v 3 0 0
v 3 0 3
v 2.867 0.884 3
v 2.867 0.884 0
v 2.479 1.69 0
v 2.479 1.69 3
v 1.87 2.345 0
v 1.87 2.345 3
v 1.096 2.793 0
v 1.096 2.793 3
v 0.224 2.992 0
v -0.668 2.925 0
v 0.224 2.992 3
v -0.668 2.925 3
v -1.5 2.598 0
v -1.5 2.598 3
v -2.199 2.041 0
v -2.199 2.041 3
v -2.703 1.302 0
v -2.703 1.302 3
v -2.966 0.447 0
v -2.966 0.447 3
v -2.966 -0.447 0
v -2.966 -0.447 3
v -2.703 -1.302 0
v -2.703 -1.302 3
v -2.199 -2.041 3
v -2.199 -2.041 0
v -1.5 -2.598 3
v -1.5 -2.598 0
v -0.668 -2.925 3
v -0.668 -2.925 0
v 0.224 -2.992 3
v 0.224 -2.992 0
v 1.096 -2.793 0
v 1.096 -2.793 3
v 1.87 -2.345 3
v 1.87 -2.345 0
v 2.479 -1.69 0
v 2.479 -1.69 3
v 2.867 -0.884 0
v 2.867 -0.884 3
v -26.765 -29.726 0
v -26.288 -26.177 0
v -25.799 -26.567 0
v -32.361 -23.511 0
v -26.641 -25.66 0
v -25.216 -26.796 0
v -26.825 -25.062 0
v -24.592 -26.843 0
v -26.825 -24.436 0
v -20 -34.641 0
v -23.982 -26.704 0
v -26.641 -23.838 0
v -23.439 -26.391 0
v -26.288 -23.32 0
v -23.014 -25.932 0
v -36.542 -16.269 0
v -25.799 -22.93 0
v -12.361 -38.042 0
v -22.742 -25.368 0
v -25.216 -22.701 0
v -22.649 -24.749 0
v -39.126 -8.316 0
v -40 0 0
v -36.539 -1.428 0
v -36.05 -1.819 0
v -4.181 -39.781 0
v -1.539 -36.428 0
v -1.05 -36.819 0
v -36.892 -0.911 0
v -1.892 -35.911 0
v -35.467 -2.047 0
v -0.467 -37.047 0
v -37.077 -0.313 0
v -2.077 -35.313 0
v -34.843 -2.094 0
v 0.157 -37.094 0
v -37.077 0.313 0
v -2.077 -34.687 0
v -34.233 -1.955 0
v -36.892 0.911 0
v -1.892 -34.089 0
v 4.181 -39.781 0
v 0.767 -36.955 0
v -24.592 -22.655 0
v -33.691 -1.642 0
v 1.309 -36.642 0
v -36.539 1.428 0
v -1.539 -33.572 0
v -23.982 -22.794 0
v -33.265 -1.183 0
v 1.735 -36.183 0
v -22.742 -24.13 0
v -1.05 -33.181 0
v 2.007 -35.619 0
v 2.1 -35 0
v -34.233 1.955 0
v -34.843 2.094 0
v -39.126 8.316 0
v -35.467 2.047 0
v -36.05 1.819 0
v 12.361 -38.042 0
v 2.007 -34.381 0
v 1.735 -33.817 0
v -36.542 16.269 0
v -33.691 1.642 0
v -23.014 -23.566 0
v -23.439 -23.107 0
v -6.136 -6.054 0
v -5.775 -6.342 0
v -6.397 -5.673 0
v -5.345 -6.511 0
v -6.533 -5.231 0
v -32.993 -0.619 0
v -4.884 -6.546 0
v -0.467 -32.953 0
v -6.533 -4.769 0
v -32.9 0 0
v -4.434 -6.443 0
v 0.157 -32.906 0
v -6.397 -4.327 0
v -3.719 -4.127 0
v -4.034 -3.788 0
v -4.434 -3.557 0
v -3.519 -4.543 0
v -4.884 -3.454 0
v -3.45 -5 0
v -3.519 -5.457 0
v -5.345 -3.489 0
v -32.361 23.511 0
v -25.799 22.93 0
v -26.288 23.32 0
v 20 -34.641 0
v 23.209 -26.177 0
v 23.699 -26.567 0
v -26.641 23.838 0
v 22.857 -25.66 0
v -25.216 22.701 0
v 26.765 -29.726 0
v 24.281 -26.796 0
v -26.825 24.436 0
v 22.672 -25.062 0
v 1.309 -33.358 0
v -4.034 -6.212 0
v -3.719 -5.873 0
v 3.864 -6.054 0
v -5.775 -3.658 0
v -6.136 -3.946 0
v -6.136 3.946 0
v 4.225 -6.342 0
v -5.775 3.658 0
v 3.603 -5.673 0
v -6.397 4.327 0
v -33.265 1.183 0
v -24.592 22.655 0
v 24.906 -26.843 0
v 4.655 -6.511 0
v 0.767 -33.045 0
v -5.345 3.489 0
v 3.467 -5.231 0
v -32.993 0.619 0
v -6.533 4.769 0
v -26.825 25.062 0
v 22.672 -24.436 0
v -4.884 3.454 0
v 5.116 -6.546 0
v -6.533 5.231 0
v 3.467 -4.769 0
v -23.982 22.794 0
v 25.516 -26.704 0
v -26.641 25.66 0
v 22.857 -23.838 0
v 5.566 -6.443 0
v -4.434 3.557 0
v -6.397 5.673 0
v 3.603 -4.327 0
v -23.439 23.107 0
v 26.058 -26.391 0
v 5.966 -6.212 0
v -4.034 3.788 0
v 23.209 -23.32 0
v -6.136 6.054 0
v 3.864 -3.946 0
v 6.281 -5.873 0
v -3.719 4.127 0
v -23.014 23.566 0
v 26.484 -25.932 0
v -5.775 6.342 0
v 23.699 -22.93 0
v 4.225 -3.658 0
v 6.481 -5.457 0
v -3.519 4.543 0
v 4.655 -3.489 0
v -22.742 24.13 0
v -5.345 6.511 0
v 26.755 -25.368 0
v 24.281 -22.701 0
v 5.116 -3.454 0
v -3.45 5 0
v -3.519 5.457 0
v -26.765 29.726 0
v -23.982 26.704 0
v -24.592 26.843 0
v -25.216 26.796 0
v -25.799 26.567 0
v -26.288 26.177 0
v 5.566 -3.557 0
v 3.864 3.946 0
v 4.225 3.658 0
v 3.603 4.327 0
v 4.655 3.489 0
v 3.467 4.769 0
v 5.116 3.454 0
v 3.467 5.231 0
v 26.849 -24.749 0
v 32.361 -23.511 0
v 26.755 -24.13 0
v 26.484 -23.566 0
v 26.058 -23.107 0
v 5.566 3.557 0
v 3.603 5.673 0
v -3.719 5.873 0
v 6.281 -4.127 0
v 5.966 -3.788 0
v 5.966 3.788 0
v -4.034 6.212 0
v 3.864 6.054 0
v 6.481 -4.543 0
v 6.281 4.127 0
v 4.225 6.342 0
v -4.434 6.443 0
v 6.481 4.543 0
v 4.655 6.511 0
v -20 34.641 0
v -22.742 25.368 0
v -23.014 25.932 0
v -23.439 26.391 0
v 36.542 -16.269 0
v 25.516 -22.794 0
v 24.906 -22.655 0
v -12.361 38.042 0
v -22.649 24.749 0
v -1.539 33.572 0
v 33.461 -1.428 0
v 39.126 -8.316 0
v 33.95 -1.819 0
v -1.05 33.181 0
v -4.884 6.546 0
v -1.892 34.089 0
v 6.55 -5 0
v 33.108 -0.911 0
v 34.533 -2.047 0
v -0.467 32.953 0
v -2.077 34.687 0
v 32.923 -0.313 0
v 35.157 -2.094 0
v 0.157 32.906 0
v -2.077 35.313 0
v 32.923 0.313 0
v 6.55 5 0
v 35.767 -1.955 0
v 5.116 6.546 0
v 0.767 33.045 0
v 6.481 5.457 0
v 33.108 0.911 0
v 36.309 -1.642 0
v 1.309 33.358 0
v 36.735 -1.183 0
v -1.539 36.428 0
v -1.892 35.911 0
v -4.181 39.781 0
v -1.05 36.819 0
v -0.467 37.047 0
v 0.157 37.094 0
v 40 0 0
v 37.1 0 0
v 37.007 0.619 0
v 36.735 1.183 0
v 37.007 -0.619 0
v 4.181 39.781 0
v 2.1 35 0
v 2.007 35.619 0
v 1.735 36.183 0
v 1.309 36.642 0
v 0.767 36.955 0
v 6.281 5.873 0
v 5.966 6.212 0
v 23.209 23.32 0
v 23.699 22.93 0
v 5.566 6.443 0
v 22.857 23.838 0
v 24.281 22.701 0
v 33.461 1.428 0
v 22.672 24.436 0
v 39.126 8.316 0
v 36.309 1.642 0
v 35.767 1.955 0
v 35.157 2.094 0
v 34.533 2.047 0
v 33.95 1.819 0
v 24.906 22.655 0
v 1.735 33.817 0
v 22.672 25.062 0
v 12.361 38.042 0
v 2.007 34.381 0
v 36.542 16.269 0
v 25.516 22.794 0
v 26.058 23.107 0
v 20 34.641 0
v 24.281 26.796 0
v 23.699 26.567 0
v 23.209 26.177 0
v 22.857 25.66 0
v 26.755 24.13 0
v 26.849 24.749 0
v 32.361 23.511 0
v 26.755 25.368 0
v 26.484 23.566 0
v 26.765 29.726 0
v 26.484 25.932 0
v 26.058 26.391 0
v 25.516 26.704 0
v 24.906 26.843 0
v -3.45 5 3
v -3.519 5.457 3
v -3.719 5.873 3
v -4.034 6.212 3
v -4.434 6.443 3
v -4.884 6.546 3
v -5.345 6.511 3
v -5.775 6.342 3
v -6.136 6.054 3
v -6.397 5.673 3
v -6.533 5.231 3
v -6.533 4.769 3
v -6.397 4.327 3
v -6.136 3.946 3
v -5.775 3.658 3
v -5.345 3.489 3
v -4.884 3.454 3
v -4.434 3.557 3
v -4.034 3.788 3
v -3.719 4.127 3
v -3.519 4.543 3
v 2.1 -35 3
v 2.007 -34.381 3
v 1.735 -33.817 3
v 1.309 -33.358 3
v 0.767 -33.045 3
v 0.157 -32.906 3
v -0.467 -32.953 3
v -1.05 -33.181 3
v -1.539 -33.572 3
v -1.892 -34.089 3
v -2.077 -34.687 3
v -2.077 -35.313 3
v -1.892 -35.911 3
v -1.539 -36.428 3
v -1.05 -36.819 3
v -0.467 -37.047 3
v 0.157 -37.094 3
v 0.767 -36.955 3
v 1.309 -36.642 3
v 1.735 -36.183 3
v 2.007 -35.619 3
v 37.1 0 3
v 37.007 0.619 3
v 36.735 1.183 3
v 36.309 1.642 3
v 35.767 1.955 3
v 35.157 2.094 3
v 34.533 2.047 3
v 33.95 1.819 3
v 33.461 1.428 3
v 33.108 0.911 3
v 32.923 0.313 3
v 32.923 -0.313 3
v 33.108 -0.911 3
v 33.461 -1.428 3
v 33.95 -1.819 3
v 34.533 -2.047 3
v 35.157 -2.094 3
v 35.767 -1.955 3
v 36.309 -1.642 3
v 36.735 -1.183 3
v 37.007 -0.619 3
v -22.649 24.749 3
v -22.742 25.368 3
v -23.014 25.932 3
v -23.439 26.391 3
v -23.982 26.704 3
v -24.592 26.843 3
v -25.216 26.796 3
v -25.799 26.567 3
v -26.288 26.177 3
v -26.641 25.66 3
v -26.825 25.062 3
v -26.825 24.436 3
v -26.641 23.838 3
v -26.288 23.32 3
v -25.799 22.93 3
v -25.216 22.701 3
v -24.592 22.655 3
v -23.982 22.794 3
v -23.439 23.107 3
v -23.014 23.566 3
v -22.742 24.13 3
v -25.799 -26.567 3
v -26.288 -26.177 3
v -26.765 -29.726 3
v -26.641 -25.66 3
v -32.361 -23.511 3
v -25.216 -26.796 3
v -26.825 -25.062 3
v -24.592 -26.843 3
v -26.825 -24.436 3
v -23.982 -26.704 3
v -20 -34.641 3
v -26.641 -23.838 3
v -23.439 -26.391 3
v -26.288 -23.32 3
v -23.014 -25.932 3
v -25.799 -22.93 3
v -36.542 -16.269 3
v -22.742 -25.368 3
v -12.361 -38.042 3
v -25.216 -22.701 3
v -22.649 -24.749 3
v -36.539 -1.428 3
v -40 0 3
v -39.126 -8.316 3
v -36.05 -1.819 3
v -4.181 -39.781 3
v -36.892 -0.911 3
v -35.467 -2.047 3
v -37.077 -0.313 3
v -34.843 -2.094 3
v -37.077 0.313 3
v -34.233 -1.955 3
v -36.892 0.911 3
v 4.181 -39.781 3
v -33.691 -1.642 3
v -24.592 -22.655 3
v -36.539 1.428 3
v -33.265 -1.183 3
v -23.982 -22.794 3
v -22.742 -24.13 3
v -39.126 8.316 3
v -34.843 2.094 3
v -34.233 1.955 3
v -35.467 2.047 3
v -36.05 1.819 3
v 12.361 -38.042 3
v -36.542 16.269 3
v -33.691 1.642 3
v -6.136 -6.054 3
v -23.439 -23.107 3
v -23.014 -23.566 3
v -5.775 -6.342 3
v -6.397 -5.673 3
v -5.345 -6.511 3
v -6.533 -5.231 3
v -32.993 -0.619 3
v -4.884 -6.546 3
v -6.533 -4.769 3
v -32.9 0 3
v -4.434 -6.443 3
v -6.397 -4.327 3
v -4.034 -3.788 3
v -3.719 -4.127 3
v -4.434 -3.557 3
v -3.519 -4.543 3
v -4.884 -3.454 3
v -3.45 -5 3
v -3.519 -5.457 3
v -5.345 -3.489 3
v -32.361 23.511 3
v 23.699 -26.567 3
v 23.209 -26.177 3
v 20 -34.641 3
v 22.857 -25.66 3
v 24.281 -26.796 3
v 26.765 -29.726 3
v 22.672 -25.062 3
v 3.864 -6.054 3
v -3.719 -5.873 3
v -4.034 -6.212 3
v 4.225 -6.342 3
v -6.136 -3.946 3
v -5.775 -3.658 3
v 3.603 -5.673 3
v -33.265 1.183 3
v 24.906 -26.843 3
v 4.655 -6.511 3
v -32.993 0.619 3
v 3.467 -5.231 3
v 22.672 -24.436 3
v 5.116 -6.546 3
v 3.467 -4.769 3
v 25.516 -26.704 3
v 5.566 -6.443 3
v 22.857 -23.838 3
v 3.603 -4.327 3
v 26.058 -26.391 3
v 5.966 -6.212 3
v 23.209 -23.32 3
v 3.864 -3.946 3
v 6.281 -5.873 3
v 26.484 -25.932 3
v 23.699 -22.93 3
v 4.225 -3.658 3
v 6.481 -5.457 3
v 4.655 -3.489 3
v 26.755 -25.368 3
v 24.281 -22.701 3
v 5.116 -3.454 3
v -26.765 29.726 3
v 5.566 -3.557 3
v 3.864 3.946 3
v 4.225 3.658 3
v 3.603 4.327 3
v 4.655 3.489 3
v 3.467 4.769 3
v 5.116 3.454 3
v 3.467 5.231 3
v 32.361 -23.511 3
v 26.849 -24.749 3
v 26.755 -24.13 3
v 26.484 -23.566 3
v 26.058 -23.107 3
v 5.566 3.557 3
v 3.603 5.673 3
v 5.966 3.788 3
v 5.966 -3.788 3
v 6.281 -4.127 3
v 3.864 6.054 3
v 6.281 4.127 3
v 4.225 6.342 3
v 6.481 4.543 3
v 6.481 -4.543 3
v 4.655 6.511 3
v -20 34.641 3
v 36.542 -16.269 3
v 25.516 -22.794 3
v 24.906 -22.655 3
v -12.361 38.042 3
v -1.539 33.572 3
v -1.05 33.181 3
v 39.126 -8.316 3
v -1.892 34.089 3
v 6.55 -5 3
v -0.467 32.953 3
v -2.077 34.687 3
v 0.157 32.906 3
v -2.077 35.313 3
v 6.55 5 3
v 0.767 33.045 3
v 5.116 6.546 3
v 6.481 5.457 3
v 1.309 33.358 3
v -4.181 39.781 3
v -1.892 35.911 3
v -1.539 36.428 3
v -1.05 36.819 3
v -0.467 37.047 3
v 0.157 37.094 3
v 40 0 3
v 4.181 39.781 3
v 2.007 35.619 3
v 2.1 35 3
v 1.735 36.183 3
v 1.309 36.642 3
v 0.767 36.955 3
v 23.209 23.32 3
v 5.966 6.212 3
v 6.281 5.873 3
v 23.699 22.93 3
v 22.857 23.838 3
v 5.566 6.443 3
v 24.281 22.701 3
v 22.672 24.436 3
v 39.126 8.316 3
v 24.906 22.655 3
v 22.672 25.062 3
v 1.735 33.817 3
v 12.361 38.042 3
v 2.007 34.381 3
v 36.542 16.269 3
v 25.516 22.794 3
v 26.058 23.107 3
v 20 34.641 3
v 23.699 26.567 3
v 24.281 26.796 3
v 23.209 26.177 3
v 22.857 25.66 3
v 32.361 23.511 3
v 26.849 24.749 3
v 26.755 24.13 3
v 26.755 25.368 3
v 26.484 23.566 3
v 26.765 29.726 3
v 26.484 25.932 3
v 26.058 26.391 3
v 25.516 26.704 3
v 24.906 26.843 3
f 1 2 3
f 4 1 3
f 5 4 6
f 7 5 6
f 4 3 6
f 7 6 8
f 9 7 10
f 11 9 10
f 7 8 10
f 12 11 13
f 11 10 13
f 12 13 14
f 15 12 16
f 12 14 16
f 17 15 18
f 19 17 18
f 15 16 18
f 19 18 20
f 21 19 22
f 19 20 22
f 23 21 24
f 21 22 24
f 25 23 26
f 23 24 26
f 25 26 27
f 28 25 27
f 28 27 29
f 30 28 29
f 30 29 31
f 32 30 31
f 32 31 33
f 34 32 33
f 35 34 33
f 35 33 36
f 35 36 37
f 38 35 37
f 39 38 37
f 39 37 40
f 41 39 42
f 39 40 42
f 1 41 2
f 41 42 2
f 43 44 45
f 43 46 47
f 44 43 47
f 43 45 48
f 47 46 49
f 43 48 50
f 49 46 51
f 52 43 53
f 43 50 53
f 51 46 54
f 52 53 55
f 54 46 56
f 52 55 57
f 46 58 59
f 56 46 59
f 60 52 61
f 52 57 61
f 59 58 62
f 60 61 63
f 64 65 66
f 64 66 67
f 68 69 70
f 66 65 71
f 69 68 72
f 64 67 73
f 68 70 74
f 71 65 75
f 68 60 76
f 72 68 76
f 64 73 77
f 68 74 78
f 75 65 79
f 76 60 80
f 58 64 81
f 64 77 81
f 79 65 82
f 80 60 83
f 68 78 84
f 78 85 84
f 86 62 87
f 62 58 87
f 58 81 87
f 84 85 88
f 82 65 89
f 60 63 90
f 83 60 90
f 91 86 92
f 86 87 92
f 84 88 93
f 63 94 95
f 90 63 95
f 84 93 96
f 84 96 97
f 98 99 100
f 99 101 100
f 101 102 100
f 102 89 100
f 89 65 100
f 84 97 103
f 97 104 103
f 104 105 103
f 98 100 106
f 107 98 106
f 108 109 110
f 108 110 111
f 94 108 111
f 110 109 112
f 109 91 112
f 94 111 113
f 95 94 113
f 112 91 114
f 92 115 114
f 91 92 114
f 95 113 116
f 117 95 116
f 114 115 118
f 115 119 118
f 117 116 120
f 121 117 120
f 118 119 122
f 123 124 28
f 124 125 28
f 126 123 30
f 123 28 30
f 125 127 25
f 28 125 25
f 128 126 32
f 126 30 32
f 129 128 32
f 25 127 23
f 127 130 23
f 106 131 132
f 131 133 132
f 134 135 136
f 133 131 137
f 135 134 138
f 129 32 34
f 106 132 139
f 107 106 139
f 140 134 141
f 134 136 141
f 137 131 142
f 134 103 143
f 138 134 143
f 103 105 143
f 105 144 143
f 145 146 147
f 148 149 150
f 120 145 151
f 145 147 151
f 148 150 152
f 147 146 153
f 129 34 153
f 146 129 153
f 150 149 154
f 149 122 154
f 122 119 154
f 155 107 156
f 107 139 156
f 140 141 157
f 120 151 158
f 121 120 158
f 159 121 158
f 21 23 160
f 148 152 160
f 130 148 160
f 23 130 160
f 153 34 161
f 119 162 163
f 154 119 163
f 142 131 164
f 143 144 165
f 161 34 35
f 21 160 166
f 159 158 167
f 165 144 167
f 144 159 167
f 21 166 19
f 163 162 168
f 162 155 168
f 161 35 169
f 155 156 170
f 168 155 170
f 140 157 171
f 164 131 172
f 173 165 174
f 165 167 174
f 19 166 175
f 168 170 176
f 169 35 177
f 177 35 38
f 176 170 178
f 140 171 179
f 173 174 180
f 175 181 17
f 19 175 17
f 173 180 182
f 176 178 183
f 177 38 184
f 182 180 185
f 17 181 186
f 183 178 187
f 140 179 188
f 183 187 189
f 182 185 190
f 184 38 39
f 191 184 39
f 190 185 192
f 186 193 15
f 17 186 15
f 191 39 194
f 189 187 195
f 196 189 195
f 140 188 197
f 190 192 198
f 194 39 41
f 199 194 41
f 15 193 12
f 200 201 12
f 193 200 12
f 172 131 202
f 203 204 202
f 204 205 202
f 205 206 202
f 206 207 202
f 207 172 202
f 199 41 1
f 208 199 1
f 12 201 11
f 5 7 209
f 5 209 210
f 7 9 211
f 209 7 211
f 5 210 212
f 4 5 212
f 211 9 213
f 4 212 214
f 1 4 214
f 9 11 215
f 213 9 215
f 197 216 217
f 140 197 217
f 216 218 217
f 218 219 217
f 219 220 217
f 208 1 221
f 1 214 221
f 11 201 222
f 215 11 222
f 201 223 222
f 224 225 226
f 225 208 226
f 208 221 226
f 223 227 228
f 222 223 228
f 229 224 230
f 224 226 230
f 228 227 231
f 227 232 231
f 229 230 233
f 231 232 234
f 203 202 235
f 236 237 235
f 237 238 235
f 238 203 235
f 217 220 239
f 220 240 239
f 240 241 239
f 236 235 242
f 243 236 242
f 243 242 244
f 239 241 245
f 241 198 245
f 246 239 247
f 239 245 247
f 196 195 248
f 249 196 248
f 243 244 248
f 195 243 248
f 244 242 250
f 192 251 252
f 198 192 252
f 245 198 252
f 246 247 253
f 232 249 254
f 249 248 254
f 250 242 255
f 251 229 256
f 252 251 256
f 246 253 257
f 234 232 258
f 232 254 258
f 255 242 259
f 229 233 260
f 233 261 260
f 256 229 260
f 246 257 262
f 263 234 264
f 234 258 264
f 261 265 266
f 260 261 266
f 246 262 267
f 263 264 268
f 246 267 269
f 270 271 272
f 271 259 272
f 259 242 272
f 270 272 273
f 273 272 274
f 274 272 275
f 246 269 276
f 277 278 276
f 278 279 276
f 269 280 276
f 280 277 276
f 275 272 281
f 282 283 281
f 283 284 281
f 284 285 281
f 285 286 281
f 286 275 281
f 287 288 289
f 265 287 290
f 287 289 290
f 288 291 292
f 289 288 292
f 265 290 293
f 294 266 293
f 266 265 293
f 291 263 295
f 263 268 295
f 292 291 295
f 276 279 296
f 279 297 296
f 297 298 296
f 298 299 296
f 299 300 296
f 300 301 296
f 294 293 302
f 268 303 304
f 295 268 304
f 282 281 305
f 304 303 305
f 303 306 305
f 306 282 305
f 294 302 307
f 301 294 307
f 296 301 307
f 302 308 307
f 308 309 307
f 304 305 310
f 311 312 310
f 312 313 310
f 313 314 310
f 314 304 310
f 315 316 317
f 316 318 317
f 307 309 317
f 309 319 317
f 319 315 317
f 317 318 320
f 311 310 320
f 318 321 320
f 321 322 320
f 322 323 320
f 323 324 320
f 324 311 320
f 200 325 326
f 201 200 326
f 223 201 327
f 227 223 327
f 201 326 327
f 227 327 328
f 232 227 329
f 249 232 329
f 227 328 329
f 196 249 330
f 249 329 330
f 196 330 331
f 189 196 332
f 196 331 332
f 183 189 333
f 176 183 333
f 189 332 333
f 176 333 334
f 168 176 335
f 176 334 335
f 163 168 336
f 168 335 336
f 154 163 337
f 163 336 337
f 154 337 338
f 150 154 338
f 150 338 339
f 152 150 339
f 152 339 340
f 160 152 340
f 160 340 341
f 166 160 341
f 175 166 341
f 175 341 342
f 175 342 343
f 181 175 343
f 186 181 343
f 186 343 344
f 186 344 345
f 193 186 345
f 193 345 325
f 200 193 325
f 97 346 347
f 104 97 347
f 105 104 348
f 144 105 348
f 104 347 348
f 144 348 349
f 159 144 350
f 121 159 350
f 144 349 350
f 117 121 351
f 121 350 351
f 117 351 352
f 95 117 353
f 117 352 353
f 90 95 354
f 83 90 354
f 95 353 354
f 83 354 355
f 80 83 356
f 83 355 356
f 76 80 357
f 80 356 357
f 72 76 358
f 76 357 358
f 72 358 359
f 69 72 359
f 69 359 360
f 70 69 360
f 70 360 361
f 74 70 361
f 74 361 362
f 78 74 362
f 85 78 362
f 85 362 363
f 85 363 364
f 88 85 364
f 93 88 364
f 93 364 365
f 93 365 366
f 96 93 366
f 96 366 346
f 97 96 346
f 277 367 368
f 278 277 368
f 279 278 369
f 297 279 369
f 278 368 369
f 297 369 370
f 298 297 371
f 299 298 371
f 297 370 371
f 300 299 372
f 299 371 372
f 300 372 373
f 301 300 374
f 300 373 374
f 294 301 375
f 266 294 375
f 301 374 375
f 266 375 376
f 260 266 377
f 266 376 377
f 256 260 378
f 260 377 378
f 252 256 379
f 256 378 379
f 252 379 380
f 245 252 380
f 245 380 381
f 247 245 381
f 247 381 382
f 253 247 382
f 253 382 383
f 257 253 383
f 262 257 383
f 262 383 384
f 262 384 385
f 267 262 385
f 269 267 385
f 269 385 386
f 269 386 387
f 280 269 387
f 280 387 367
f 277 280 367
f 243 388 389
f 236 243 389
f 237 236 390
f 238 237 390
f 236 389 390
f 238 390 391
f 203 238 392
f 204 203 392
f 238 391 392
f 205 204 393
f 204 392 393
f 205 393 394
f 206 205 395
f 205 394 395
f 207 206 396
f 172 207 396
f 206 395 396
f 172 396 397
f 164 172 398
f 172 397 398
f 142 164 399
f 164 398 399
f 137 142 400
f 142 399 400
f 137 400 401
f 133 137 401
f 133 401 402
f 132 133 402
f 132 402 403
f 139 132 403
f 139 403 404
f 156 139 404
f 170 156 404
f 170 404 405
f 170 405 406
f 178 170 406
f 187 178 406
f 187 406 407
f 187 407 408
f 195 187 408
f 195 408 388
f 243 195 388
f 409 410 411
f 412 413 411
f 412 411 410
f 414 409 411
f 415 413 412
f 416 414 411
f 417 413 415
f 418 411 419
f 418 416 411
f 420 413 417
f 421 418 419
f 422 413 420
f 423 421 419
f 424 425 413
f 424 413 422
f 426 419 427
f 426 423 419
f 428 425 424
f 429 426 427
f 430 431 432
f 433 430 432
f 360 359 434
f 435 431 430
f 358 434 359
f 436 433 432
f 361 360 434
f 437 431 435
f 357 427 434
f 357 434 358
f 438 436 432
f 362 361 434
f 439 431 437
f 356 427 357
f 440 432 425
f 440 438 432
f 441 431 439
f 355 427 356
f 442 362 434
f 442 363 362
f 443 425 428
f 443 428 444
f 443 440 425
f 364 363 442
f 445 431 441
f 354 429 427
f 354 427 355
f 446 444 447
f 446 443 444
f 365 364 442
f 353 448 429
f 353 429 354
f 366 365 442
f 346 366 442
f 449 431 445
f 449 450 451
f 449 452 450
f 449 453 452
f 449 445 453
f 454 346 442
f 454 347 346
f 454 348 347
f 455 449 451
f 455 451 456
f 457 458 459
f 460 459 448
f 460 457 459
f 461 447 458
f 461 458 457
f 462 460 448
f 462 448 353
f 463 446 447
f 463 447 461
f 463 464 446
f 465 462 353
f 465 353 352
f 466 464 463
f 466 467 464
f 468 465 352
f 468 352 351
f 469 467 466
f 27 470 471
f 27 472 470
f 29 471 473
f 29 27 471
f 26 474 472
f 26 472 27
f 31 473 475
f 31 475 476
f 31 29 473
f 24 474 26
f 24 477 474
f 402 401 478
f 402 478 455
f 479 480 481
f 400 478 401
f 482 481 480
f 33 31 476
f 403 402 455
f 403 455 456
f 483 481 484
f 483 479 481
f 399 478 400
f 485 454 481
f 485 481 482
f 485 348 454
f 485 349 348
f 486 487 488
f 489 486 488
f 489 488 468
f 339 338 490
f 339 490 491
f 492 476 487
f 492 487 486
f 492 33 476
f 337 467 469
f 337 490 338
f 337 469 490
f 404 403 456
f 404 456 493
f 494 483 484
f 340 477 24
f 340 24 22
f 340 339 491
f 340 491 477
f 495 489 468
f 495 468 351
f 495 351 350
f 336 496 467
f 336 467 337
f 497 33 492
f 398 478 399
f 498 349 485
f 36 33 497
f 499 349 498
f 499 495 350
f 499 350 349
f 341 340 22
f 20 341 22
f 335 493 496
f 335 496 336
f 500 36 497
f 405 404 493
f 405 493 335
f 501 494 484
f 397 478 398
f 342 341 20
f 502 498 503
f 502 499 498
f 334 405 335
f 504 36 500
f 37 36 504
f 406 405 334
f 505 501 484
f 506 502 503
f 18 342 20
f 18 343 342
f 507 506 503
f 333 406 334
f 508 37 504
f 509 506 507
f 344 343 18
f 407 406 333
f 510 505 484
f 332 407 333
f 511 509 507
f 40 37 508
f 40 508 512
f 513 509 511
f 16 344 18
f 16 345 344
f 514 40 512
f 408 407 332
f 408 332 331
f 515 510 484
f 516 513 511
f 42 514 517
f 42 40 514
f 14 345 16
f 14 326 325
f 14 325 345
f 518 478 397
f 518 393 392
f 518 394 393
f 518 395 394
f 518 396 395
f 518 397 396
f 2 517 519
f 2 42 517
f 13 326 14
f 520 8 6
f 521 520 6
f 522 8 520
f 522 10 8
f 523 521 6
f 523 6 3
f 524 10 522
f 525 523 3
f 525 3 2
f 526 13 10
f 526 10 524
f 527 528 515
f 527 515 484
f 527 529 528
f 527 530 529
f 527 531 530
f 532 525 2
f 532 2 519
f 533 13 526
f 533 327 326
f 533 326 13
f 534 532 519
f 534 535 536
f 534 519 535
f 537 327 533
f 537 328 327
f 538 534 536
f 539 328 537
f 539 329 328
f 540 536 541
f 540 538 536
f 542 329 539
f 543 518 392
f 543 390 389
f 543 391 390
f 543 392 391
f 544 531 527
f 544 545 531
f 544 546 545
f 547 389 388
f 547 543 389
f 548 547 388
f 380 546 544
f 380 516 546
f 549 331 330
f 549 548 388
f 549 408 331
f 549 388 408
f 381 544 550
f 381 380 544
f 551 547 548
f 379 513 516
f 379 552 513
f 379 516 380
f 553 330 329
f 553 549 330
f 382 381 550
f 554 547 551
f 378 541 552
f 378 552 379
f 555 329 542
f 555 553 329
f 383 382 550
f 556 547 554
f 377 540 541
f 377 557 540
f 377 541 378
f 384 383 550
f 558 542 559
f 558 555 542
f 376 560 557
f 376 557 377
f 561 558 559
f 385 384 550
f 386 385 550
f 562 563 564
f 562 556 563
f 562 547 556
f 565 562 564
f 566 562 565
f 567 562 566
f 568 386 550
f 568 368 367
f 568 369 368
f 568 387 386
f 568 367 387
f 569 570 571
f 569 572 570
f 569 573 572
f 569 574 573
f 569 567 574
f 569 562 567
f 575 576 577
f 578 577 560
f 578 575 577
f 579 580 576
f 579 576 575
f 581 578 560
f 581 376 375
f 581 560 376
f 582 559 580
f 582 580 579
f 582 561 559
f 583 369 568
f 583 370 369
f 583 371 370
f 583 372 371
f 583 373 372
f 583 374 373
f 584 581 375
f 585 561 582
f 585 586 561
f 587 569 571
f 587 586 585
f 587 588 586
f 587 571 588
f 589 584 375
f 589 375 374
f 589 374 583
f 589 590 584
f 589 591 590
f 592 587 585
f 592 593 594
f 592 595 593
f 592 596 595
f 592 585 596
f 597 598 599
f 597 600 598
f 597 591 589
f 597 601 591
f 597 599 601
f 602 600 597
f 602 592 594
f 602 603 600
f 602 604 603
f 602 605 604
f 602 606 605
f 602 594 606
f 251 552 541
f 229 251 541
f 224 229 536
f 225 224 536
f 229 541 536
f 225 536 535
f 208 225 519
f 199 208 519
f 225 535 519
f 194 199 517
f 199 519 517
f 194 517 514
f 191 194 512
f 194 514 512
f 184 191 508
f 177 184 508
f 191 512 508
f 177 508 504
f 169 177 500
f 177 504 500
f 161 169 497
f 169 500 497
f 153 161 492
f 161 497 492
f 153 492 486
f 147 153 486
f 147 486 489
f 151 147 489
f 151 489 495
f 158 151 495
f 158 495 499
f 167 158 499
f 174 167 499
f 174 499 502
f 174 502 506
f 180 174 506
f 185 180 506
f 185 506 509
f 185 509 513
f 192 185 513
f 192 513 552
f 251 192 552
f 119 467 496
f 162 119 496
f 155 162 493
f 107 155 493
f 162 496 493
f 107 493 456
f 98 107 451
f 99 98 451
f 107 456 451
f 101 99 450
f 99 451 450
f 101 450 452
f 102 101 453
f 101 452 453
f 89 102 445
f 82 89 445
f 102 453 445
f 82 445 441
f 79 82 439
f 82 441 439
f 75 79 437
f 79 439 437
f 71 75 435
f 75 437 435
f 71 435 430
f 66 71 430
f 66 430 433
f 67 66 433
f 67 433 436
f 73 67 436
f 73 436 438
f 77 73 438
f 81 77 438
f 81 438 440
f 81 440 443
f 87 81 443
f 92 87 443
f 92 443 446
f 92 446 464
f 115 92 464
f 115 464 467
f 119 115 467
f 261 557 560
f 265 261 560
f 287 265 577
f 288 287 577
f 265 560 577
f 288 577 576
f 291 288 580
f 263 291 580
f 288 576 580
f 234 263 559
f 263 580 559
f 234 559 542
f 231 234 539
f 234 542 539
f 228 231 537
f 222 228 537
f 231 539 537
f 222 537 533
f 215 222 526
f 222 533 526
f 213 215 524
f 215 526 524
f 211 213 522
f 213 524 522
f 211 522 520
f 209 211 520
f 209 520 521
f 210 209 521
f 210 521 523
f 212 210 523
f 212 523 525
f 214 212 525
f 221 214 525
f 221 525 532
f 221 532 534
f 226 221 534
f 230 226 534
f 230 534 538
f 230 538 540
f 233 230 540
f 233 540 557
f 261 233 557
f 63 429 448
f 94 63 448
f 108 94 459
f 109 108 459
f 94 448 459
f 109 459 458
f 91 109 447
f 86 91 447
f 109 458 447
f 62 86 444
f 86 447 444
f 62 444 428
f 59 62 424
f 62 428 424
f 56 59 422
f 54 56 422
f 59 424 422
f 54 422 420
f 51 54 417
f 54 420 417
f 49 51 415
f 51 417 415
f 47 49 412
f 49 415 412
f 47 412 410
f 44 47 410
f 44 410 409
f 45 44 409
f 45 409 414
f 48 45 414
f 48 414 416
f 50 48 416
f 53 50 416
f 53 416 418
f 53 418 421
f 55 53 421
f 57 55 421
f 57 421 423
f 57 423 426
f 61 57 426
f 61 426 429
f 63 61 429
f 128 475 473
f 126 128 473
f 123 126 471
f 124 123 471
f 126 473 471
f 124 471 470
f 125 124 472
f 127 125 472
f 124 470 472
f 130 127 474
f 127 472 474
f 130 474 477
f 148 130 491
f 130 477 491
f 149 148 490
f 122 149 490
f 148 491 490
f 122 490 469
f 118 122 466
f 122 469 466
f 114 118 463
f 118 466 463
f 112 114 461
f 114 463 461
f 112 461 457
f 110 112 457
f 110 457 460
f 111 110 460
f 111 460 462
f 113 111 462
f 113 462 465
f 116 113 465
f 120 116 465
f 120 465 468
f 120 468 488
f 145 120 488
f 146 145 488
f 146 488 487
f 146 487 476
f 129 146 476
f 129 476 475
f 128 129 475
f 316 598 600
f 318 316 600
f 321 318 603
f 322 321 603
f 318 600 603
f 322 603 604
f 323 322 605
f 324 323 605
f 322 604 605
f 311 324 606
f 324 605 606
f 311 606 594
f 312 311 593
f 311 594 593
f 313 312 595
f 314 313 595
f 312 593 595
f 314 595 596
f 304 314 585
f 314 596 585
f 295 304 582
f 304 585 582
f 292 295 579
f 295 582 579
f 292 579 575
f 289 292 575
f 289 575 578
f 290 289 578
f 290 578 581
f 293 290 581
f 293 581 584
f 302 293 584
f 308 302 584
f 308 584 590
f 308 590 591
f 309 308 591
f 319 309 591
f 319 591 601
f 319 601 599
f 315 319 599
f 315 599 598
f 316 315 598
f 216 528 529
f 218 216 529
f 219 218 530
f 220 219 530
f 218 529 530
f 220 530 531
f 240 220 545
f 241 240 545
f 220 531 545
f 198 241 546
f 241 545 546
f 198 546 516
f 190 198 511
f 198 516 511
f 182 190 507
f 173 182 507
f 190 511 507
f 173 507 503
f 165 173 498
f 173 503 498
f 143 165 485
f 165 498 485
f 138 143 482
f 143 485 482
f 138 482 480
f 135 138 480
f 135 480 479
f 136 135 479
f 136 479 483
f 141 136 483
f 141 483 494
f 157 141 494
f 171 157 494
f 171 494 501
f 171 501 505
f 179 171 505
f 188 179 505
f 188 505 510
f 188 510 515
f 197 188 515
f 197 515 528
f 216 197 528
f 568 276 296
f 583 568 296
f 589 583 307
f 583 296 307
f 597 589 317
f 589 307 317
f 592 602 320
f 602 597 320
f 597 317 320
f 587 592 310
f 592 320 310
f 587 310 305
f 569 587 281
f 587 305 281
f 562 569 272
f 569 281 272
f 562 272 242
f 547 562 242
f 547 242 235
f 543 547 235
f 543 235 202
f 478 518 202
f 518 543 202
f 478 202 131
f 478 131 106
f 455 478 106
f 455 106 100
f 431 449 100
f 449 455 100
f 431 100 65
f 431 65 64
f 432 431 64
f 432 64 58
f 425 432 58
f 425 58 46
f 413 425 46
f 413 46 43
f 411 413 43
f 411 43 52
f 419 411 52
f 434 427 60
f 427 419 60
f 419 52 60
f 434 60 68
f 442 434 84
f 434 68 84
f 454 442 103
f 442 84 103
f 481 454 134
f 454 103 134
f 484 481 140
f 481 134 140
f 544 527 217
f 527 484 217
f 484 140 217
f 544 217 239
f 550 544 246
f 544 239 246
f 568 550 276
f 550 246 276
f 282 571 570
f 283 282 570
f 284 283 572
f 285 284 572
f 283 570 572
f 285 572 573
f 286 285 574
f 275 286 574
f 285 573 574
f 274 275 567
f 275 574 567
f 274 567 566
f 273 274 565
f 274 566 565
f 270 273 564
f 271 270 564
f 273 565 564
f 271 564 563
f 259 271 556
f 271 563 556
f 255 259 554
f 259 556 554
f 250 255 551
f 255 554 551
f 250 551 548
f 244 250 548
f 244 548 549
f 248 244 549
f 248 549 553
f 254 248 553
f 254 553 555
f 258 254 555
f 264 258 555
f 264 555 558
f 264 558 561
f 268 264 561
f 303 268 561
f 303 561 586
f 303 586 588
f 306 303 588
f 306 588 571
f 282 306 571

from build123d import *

# Parameters (mm, degrees)
SKETCH_3_R           = 48
EXTRUDE_2_DEPTH      = 3
SKETCH_4_R           = 3
CUT_EXTRUDE_1_DEPTH  = 3
EXTRUDE_3_DEPTH      = 35
SKETCH_6_R           = 3
SKETCH_6_R_2         = 1.5
CUT_EXTRUDE_2_DEPTH  = 35
SKETCH_7_R           = 1.55
CUT_EXTRUDE_5_DEPTH  = 35
CUT_EXTRUDE_START    = -35
SKETCH_9_R           = 48
SKETCH_9_R_2         = 40
CUT_EXTRUDE_6_DEPTH  = 35
SKETCH_10_R          = 40
CUT_EXTRUDE_7_DEPTH  = 35
SKETCH_11_W          = 111.588244868
SKETCH_11_H          = 82.223617215
CUT_EXTRUDE_8_DEPTH  = 35
SKETCH_12_R          = 1
CUT_EXTRUDE_9_DEPTH  = 35
SKETCH_13_R          = 2.1
CUT_EXTRUDE_10_DEPTH = 35
SKETCH_14_R          = 1.55
CUT_EXTRUDE_11_DEPTH = 35


with BuildPart() as part:
    # 草图3 → 凸台-拉伸2 (new body)
    with BuildSketch(Plane.XY):
        Circle(SKETCH_3_R)
    extrude(amount=EXTRUDE_2_DEPTH)

    # 草图4 → 切除-拉伸1 (cut)
    with BuildSketch(Plane.XY.offset(3)):
        Circle(SKETCH_4_R)
    extrude(amount=-CUT_EXTRUDE_1_DEPTH, mode=Mode.SUBTRACT)

    # 草图5 → 凸台-拉伸3 (add)
    with BuildSketch(Plane.XY.offset(3)):
        with BuildLine():
            ThreePointArc((0, 12.5), (0.146446609, 12.853553391), (0.5, 13))
            Line((0.5, 13), (39.5, 13))
            ThreePointArc((39.5, 13), (39.853553391, 12.853553391), (40, 12.5))
            Line((40, 12.5), (40, -12.5))
            ThreePointArc((40, -12.5), (39.853553391, -12.853553391), (39.5, -13))
            Line((39.5, -13), (0.5, -13))
            ThreePointArc((0.5, -13), (0.146446609, -12.853553391), (0, -12.5))
            Line((0, -12.5), (0, -11.5))
            ThreePointArc((0, -11.5), (0.146446609, -11.146446609), (0.5, -11))
            Line((0.5, -11), (37.5, -11))
            ThreePointArc((37.5, -11), (37.853553391, -10.853553391), (38, -10.5))
            Line((38, -10.5), (38, 0))
            Line((38, 0), (38, 10.5))
            ThreePointArc((38, 10.5), (37.853553391, 10.853553391), (37.5, 11))
            Line((37.5, 11), (0.5, 11))
            ThreePointArc((0.5, 11), (0.146446609, 11.146446609), (0, 11.5))
            Line((0, 11.5), (0, 12.5))
        make_face()
    extrude(amount=EXTRUDE_3_DEPTH)

    # 草图6 → 切除-拉伸2 (cut)
    with BuildSketch(Plane(origin=(40, 0, 0), x_dir=(0, 0, -1), z_dir=(1, 0, 0))):
        with Locations((-25, 0)):
            Circle(SKETCH_6_R)
        with Locations((-20, -5)):
            Circle(SKETCH_6_R_2)
        with Locations((-20, 5)):
            Circle(SKETCH_6_R_2)
        with Locations((-30, -5)):
            Circle(SKETCH_6_R_2)
        with Locations((-30, 5)):
            Circle(SKETCH_6_R_2)
    extrude(amount=-CUT_EXTRUDE_2_DEPTH, mode=Mode.SUBTRACT)

    # 草图7 → 切除-拉伸5 (cut)
    with BuildSketch(Plane.XY.offset(3)):
        with Locations((-35, 0)):
            Circle(SKETCH_7_R)
        with Locations((-24.748737342, 24.748737342)):
            Circle(SKETCH_7_R)
        with Locations((0, 35)):
            Circle(SKETCH_7_R)
        with Locations((24.748737342, 24.748737342)):
            Circle(SKETCH_7_R)
        with Locations((35, 0)):
            Circle(SKETCH_7_R)
        with Locations((24.748737342, -24.748737342)):
            Circle(SKETCH_7_R)
        with Locations((0, -35)):
            Circle(SKETCH_7_R)
        with Locations((-24.748737342, -24.748737342)):
            Circle(SKETCH_7_R)
    extrude(amount=-CUT_EXTRUDE_5_DEPTH, mode=Mode.SUBTRACT)

    # 草图9 → 切除-拉伸6 (cut)
    with BuildSketch(Plane.XY.offset(3).offset(CUT_EXTRUDE_START)):
        Circle(SKETCH_9_R)
        Circle(SKETCH_9_R_2, mode=Mode.SUBTRACT)
    extrude(amount=CUT_EXTRUDE_6_DEPTH, mode=Mode.SUBTRACT)

    # 草图10 → 切除-拉伸7 (cut)
    with BuildSketch(Plane.XY.offset(3)):
        Circle(SKETCH_10_R)
    extrude(amount=CUT_EXTRUDE_7_DEPTH, mode=Mode.SUBTRACT)


with BuildPart() as cut_extrude_7_piece_1:
    # of the separate pieces the step leaves, piece 1, a body of its own (cut_extrude_7_pieces)
    add(part.part.solids().sort_by_distance((40, 0, 0))[0])

    # 草图12 → 切除-拉伸9 (cut)
    with BuildSketch(Plane.XY.offset(3)):
        with BuildLine():
            ThreePointArc((-4, 5), (-5.707106781, 5.707106781), (-5, 4))
            Line((-5, 4), (-5, 5))
            Line((-5, 5), (-4, 5))
        make_face()
        with BuildLine():
            Line((-5, 5), (-5, 4))
            ThreePointArc((-5, 4), (-4.292893219, 4.292893219), (-4, 5))
            Line((-4, 5), (-5, 5))
        make_face()
        with Locations((-5, -5)):
            Circle(SKETCH_12_R)
        with Locations((5, -5)):
            Circle(SKETCH_12_R)
        with Locations((5, 5)):
            Circle(SKETCH_12_R)
    extrude(amount=-CUT_EXTRUDE_9_DEPTH, mode=Mode.SUBTRACT)

    # 草图13 → 切除-拉伸10 (cut)
    with BuildSketch(Plane.XY.offset(3)):
        with Locations((0, 35)):
            Circle(SKETCH_13_R)
        with Locations((24.748737342, 24.748737342)):
            Circle(SKETCH_13_R)
        with Locations((35, 0)):
            Circle(SKETCH_13_R)
        with Locations((24.748737342, -24.748737342)):
            Circle(SKETCH_13_R)
        with Locations((0, -35)):
            Circle(SKETCH_13_R)
        with Locations((-24.748737342, -24.748737342)):
            Circle(SKETCH_13_R)
        with Locations((-35, 0)):
            Circle(SKETCH_13_R)
        with Locations((-24.748737342, 24.748737342)):
            Circle(SKETCH_13_R)
    extrude(amount=-CUT_EXTRUDE_10_DEPTH, mode=Mode.SUBTRACT)

    # 草图14 → 切除-拉伸11 (cut)
    with BuildSketch(Plane.XY.offset(3)):
        with Locations((-5, 5)):
            Circle(SKETCH_14_R)
        with Locations((5, 5)):
            Circle(SKETCH_14_R)
        with Locations((5, -5)):
            Circle(SKETCH_14_R)
        with Locations((-5, -5)):
            Circle(SKETCH_14_R)
    extrude(amount=-CUT_EXTRUDE_11_DEPTH, mode=Mode.SUBTRACT)


with BuildPart() as cut_extrude_7_piece_2:
    # of the separate pieces the step leaves, piece 2, a body of its own (cut_extrude_7_pieces)
    add(part.part.solids().sort_by_distance((40, -12.5, 3))[0])


with BuildPart() as cut_extrude_7_piece_3:
    # of the separate pieces the step leaves, piece 3, a body of its own (cut_extrude_7_pieces)
    add(part.part.solids().sort_by_distance((39.5, 13, 3))[0])


with BuildPart() as cut_extrude_8_tool:
    # 草图11 → 切除-拉伸8 (new body)
    with BuildSketch(Plane(origin=(40, 0, 0), x_dir=(0, 0, -1), z_dir=(1, 0, 0))):
        with Locations((-58.794122434, 24.320721942)):
            Rectangle(SKETCH_11_W, SKETCH_11_H)
    extrude(amount=-CUT_EXTRUDE_8_DEPTH)


with BuildPart() as cut_extrude_7_piece_2_1:
    add(cut_extrude_7_piece_2.part)

    # 切除-拉伸8: cut by cut_extrude_8_tool
    add(cut_extrude_8_tool.part, mode=Mode.SUBTRACT)


with BuildPart() as cut_extrude_7_piece_3_1:
    add(cut_extrude_7_piece_3.part)

    # 切除-拉伸8: cut by cut_extrude_8_tool
    add(cut_extrude_8_tool.part, mode=Mode.SUBTRACT)


solid = cut_extrude_7_piece_1.part
